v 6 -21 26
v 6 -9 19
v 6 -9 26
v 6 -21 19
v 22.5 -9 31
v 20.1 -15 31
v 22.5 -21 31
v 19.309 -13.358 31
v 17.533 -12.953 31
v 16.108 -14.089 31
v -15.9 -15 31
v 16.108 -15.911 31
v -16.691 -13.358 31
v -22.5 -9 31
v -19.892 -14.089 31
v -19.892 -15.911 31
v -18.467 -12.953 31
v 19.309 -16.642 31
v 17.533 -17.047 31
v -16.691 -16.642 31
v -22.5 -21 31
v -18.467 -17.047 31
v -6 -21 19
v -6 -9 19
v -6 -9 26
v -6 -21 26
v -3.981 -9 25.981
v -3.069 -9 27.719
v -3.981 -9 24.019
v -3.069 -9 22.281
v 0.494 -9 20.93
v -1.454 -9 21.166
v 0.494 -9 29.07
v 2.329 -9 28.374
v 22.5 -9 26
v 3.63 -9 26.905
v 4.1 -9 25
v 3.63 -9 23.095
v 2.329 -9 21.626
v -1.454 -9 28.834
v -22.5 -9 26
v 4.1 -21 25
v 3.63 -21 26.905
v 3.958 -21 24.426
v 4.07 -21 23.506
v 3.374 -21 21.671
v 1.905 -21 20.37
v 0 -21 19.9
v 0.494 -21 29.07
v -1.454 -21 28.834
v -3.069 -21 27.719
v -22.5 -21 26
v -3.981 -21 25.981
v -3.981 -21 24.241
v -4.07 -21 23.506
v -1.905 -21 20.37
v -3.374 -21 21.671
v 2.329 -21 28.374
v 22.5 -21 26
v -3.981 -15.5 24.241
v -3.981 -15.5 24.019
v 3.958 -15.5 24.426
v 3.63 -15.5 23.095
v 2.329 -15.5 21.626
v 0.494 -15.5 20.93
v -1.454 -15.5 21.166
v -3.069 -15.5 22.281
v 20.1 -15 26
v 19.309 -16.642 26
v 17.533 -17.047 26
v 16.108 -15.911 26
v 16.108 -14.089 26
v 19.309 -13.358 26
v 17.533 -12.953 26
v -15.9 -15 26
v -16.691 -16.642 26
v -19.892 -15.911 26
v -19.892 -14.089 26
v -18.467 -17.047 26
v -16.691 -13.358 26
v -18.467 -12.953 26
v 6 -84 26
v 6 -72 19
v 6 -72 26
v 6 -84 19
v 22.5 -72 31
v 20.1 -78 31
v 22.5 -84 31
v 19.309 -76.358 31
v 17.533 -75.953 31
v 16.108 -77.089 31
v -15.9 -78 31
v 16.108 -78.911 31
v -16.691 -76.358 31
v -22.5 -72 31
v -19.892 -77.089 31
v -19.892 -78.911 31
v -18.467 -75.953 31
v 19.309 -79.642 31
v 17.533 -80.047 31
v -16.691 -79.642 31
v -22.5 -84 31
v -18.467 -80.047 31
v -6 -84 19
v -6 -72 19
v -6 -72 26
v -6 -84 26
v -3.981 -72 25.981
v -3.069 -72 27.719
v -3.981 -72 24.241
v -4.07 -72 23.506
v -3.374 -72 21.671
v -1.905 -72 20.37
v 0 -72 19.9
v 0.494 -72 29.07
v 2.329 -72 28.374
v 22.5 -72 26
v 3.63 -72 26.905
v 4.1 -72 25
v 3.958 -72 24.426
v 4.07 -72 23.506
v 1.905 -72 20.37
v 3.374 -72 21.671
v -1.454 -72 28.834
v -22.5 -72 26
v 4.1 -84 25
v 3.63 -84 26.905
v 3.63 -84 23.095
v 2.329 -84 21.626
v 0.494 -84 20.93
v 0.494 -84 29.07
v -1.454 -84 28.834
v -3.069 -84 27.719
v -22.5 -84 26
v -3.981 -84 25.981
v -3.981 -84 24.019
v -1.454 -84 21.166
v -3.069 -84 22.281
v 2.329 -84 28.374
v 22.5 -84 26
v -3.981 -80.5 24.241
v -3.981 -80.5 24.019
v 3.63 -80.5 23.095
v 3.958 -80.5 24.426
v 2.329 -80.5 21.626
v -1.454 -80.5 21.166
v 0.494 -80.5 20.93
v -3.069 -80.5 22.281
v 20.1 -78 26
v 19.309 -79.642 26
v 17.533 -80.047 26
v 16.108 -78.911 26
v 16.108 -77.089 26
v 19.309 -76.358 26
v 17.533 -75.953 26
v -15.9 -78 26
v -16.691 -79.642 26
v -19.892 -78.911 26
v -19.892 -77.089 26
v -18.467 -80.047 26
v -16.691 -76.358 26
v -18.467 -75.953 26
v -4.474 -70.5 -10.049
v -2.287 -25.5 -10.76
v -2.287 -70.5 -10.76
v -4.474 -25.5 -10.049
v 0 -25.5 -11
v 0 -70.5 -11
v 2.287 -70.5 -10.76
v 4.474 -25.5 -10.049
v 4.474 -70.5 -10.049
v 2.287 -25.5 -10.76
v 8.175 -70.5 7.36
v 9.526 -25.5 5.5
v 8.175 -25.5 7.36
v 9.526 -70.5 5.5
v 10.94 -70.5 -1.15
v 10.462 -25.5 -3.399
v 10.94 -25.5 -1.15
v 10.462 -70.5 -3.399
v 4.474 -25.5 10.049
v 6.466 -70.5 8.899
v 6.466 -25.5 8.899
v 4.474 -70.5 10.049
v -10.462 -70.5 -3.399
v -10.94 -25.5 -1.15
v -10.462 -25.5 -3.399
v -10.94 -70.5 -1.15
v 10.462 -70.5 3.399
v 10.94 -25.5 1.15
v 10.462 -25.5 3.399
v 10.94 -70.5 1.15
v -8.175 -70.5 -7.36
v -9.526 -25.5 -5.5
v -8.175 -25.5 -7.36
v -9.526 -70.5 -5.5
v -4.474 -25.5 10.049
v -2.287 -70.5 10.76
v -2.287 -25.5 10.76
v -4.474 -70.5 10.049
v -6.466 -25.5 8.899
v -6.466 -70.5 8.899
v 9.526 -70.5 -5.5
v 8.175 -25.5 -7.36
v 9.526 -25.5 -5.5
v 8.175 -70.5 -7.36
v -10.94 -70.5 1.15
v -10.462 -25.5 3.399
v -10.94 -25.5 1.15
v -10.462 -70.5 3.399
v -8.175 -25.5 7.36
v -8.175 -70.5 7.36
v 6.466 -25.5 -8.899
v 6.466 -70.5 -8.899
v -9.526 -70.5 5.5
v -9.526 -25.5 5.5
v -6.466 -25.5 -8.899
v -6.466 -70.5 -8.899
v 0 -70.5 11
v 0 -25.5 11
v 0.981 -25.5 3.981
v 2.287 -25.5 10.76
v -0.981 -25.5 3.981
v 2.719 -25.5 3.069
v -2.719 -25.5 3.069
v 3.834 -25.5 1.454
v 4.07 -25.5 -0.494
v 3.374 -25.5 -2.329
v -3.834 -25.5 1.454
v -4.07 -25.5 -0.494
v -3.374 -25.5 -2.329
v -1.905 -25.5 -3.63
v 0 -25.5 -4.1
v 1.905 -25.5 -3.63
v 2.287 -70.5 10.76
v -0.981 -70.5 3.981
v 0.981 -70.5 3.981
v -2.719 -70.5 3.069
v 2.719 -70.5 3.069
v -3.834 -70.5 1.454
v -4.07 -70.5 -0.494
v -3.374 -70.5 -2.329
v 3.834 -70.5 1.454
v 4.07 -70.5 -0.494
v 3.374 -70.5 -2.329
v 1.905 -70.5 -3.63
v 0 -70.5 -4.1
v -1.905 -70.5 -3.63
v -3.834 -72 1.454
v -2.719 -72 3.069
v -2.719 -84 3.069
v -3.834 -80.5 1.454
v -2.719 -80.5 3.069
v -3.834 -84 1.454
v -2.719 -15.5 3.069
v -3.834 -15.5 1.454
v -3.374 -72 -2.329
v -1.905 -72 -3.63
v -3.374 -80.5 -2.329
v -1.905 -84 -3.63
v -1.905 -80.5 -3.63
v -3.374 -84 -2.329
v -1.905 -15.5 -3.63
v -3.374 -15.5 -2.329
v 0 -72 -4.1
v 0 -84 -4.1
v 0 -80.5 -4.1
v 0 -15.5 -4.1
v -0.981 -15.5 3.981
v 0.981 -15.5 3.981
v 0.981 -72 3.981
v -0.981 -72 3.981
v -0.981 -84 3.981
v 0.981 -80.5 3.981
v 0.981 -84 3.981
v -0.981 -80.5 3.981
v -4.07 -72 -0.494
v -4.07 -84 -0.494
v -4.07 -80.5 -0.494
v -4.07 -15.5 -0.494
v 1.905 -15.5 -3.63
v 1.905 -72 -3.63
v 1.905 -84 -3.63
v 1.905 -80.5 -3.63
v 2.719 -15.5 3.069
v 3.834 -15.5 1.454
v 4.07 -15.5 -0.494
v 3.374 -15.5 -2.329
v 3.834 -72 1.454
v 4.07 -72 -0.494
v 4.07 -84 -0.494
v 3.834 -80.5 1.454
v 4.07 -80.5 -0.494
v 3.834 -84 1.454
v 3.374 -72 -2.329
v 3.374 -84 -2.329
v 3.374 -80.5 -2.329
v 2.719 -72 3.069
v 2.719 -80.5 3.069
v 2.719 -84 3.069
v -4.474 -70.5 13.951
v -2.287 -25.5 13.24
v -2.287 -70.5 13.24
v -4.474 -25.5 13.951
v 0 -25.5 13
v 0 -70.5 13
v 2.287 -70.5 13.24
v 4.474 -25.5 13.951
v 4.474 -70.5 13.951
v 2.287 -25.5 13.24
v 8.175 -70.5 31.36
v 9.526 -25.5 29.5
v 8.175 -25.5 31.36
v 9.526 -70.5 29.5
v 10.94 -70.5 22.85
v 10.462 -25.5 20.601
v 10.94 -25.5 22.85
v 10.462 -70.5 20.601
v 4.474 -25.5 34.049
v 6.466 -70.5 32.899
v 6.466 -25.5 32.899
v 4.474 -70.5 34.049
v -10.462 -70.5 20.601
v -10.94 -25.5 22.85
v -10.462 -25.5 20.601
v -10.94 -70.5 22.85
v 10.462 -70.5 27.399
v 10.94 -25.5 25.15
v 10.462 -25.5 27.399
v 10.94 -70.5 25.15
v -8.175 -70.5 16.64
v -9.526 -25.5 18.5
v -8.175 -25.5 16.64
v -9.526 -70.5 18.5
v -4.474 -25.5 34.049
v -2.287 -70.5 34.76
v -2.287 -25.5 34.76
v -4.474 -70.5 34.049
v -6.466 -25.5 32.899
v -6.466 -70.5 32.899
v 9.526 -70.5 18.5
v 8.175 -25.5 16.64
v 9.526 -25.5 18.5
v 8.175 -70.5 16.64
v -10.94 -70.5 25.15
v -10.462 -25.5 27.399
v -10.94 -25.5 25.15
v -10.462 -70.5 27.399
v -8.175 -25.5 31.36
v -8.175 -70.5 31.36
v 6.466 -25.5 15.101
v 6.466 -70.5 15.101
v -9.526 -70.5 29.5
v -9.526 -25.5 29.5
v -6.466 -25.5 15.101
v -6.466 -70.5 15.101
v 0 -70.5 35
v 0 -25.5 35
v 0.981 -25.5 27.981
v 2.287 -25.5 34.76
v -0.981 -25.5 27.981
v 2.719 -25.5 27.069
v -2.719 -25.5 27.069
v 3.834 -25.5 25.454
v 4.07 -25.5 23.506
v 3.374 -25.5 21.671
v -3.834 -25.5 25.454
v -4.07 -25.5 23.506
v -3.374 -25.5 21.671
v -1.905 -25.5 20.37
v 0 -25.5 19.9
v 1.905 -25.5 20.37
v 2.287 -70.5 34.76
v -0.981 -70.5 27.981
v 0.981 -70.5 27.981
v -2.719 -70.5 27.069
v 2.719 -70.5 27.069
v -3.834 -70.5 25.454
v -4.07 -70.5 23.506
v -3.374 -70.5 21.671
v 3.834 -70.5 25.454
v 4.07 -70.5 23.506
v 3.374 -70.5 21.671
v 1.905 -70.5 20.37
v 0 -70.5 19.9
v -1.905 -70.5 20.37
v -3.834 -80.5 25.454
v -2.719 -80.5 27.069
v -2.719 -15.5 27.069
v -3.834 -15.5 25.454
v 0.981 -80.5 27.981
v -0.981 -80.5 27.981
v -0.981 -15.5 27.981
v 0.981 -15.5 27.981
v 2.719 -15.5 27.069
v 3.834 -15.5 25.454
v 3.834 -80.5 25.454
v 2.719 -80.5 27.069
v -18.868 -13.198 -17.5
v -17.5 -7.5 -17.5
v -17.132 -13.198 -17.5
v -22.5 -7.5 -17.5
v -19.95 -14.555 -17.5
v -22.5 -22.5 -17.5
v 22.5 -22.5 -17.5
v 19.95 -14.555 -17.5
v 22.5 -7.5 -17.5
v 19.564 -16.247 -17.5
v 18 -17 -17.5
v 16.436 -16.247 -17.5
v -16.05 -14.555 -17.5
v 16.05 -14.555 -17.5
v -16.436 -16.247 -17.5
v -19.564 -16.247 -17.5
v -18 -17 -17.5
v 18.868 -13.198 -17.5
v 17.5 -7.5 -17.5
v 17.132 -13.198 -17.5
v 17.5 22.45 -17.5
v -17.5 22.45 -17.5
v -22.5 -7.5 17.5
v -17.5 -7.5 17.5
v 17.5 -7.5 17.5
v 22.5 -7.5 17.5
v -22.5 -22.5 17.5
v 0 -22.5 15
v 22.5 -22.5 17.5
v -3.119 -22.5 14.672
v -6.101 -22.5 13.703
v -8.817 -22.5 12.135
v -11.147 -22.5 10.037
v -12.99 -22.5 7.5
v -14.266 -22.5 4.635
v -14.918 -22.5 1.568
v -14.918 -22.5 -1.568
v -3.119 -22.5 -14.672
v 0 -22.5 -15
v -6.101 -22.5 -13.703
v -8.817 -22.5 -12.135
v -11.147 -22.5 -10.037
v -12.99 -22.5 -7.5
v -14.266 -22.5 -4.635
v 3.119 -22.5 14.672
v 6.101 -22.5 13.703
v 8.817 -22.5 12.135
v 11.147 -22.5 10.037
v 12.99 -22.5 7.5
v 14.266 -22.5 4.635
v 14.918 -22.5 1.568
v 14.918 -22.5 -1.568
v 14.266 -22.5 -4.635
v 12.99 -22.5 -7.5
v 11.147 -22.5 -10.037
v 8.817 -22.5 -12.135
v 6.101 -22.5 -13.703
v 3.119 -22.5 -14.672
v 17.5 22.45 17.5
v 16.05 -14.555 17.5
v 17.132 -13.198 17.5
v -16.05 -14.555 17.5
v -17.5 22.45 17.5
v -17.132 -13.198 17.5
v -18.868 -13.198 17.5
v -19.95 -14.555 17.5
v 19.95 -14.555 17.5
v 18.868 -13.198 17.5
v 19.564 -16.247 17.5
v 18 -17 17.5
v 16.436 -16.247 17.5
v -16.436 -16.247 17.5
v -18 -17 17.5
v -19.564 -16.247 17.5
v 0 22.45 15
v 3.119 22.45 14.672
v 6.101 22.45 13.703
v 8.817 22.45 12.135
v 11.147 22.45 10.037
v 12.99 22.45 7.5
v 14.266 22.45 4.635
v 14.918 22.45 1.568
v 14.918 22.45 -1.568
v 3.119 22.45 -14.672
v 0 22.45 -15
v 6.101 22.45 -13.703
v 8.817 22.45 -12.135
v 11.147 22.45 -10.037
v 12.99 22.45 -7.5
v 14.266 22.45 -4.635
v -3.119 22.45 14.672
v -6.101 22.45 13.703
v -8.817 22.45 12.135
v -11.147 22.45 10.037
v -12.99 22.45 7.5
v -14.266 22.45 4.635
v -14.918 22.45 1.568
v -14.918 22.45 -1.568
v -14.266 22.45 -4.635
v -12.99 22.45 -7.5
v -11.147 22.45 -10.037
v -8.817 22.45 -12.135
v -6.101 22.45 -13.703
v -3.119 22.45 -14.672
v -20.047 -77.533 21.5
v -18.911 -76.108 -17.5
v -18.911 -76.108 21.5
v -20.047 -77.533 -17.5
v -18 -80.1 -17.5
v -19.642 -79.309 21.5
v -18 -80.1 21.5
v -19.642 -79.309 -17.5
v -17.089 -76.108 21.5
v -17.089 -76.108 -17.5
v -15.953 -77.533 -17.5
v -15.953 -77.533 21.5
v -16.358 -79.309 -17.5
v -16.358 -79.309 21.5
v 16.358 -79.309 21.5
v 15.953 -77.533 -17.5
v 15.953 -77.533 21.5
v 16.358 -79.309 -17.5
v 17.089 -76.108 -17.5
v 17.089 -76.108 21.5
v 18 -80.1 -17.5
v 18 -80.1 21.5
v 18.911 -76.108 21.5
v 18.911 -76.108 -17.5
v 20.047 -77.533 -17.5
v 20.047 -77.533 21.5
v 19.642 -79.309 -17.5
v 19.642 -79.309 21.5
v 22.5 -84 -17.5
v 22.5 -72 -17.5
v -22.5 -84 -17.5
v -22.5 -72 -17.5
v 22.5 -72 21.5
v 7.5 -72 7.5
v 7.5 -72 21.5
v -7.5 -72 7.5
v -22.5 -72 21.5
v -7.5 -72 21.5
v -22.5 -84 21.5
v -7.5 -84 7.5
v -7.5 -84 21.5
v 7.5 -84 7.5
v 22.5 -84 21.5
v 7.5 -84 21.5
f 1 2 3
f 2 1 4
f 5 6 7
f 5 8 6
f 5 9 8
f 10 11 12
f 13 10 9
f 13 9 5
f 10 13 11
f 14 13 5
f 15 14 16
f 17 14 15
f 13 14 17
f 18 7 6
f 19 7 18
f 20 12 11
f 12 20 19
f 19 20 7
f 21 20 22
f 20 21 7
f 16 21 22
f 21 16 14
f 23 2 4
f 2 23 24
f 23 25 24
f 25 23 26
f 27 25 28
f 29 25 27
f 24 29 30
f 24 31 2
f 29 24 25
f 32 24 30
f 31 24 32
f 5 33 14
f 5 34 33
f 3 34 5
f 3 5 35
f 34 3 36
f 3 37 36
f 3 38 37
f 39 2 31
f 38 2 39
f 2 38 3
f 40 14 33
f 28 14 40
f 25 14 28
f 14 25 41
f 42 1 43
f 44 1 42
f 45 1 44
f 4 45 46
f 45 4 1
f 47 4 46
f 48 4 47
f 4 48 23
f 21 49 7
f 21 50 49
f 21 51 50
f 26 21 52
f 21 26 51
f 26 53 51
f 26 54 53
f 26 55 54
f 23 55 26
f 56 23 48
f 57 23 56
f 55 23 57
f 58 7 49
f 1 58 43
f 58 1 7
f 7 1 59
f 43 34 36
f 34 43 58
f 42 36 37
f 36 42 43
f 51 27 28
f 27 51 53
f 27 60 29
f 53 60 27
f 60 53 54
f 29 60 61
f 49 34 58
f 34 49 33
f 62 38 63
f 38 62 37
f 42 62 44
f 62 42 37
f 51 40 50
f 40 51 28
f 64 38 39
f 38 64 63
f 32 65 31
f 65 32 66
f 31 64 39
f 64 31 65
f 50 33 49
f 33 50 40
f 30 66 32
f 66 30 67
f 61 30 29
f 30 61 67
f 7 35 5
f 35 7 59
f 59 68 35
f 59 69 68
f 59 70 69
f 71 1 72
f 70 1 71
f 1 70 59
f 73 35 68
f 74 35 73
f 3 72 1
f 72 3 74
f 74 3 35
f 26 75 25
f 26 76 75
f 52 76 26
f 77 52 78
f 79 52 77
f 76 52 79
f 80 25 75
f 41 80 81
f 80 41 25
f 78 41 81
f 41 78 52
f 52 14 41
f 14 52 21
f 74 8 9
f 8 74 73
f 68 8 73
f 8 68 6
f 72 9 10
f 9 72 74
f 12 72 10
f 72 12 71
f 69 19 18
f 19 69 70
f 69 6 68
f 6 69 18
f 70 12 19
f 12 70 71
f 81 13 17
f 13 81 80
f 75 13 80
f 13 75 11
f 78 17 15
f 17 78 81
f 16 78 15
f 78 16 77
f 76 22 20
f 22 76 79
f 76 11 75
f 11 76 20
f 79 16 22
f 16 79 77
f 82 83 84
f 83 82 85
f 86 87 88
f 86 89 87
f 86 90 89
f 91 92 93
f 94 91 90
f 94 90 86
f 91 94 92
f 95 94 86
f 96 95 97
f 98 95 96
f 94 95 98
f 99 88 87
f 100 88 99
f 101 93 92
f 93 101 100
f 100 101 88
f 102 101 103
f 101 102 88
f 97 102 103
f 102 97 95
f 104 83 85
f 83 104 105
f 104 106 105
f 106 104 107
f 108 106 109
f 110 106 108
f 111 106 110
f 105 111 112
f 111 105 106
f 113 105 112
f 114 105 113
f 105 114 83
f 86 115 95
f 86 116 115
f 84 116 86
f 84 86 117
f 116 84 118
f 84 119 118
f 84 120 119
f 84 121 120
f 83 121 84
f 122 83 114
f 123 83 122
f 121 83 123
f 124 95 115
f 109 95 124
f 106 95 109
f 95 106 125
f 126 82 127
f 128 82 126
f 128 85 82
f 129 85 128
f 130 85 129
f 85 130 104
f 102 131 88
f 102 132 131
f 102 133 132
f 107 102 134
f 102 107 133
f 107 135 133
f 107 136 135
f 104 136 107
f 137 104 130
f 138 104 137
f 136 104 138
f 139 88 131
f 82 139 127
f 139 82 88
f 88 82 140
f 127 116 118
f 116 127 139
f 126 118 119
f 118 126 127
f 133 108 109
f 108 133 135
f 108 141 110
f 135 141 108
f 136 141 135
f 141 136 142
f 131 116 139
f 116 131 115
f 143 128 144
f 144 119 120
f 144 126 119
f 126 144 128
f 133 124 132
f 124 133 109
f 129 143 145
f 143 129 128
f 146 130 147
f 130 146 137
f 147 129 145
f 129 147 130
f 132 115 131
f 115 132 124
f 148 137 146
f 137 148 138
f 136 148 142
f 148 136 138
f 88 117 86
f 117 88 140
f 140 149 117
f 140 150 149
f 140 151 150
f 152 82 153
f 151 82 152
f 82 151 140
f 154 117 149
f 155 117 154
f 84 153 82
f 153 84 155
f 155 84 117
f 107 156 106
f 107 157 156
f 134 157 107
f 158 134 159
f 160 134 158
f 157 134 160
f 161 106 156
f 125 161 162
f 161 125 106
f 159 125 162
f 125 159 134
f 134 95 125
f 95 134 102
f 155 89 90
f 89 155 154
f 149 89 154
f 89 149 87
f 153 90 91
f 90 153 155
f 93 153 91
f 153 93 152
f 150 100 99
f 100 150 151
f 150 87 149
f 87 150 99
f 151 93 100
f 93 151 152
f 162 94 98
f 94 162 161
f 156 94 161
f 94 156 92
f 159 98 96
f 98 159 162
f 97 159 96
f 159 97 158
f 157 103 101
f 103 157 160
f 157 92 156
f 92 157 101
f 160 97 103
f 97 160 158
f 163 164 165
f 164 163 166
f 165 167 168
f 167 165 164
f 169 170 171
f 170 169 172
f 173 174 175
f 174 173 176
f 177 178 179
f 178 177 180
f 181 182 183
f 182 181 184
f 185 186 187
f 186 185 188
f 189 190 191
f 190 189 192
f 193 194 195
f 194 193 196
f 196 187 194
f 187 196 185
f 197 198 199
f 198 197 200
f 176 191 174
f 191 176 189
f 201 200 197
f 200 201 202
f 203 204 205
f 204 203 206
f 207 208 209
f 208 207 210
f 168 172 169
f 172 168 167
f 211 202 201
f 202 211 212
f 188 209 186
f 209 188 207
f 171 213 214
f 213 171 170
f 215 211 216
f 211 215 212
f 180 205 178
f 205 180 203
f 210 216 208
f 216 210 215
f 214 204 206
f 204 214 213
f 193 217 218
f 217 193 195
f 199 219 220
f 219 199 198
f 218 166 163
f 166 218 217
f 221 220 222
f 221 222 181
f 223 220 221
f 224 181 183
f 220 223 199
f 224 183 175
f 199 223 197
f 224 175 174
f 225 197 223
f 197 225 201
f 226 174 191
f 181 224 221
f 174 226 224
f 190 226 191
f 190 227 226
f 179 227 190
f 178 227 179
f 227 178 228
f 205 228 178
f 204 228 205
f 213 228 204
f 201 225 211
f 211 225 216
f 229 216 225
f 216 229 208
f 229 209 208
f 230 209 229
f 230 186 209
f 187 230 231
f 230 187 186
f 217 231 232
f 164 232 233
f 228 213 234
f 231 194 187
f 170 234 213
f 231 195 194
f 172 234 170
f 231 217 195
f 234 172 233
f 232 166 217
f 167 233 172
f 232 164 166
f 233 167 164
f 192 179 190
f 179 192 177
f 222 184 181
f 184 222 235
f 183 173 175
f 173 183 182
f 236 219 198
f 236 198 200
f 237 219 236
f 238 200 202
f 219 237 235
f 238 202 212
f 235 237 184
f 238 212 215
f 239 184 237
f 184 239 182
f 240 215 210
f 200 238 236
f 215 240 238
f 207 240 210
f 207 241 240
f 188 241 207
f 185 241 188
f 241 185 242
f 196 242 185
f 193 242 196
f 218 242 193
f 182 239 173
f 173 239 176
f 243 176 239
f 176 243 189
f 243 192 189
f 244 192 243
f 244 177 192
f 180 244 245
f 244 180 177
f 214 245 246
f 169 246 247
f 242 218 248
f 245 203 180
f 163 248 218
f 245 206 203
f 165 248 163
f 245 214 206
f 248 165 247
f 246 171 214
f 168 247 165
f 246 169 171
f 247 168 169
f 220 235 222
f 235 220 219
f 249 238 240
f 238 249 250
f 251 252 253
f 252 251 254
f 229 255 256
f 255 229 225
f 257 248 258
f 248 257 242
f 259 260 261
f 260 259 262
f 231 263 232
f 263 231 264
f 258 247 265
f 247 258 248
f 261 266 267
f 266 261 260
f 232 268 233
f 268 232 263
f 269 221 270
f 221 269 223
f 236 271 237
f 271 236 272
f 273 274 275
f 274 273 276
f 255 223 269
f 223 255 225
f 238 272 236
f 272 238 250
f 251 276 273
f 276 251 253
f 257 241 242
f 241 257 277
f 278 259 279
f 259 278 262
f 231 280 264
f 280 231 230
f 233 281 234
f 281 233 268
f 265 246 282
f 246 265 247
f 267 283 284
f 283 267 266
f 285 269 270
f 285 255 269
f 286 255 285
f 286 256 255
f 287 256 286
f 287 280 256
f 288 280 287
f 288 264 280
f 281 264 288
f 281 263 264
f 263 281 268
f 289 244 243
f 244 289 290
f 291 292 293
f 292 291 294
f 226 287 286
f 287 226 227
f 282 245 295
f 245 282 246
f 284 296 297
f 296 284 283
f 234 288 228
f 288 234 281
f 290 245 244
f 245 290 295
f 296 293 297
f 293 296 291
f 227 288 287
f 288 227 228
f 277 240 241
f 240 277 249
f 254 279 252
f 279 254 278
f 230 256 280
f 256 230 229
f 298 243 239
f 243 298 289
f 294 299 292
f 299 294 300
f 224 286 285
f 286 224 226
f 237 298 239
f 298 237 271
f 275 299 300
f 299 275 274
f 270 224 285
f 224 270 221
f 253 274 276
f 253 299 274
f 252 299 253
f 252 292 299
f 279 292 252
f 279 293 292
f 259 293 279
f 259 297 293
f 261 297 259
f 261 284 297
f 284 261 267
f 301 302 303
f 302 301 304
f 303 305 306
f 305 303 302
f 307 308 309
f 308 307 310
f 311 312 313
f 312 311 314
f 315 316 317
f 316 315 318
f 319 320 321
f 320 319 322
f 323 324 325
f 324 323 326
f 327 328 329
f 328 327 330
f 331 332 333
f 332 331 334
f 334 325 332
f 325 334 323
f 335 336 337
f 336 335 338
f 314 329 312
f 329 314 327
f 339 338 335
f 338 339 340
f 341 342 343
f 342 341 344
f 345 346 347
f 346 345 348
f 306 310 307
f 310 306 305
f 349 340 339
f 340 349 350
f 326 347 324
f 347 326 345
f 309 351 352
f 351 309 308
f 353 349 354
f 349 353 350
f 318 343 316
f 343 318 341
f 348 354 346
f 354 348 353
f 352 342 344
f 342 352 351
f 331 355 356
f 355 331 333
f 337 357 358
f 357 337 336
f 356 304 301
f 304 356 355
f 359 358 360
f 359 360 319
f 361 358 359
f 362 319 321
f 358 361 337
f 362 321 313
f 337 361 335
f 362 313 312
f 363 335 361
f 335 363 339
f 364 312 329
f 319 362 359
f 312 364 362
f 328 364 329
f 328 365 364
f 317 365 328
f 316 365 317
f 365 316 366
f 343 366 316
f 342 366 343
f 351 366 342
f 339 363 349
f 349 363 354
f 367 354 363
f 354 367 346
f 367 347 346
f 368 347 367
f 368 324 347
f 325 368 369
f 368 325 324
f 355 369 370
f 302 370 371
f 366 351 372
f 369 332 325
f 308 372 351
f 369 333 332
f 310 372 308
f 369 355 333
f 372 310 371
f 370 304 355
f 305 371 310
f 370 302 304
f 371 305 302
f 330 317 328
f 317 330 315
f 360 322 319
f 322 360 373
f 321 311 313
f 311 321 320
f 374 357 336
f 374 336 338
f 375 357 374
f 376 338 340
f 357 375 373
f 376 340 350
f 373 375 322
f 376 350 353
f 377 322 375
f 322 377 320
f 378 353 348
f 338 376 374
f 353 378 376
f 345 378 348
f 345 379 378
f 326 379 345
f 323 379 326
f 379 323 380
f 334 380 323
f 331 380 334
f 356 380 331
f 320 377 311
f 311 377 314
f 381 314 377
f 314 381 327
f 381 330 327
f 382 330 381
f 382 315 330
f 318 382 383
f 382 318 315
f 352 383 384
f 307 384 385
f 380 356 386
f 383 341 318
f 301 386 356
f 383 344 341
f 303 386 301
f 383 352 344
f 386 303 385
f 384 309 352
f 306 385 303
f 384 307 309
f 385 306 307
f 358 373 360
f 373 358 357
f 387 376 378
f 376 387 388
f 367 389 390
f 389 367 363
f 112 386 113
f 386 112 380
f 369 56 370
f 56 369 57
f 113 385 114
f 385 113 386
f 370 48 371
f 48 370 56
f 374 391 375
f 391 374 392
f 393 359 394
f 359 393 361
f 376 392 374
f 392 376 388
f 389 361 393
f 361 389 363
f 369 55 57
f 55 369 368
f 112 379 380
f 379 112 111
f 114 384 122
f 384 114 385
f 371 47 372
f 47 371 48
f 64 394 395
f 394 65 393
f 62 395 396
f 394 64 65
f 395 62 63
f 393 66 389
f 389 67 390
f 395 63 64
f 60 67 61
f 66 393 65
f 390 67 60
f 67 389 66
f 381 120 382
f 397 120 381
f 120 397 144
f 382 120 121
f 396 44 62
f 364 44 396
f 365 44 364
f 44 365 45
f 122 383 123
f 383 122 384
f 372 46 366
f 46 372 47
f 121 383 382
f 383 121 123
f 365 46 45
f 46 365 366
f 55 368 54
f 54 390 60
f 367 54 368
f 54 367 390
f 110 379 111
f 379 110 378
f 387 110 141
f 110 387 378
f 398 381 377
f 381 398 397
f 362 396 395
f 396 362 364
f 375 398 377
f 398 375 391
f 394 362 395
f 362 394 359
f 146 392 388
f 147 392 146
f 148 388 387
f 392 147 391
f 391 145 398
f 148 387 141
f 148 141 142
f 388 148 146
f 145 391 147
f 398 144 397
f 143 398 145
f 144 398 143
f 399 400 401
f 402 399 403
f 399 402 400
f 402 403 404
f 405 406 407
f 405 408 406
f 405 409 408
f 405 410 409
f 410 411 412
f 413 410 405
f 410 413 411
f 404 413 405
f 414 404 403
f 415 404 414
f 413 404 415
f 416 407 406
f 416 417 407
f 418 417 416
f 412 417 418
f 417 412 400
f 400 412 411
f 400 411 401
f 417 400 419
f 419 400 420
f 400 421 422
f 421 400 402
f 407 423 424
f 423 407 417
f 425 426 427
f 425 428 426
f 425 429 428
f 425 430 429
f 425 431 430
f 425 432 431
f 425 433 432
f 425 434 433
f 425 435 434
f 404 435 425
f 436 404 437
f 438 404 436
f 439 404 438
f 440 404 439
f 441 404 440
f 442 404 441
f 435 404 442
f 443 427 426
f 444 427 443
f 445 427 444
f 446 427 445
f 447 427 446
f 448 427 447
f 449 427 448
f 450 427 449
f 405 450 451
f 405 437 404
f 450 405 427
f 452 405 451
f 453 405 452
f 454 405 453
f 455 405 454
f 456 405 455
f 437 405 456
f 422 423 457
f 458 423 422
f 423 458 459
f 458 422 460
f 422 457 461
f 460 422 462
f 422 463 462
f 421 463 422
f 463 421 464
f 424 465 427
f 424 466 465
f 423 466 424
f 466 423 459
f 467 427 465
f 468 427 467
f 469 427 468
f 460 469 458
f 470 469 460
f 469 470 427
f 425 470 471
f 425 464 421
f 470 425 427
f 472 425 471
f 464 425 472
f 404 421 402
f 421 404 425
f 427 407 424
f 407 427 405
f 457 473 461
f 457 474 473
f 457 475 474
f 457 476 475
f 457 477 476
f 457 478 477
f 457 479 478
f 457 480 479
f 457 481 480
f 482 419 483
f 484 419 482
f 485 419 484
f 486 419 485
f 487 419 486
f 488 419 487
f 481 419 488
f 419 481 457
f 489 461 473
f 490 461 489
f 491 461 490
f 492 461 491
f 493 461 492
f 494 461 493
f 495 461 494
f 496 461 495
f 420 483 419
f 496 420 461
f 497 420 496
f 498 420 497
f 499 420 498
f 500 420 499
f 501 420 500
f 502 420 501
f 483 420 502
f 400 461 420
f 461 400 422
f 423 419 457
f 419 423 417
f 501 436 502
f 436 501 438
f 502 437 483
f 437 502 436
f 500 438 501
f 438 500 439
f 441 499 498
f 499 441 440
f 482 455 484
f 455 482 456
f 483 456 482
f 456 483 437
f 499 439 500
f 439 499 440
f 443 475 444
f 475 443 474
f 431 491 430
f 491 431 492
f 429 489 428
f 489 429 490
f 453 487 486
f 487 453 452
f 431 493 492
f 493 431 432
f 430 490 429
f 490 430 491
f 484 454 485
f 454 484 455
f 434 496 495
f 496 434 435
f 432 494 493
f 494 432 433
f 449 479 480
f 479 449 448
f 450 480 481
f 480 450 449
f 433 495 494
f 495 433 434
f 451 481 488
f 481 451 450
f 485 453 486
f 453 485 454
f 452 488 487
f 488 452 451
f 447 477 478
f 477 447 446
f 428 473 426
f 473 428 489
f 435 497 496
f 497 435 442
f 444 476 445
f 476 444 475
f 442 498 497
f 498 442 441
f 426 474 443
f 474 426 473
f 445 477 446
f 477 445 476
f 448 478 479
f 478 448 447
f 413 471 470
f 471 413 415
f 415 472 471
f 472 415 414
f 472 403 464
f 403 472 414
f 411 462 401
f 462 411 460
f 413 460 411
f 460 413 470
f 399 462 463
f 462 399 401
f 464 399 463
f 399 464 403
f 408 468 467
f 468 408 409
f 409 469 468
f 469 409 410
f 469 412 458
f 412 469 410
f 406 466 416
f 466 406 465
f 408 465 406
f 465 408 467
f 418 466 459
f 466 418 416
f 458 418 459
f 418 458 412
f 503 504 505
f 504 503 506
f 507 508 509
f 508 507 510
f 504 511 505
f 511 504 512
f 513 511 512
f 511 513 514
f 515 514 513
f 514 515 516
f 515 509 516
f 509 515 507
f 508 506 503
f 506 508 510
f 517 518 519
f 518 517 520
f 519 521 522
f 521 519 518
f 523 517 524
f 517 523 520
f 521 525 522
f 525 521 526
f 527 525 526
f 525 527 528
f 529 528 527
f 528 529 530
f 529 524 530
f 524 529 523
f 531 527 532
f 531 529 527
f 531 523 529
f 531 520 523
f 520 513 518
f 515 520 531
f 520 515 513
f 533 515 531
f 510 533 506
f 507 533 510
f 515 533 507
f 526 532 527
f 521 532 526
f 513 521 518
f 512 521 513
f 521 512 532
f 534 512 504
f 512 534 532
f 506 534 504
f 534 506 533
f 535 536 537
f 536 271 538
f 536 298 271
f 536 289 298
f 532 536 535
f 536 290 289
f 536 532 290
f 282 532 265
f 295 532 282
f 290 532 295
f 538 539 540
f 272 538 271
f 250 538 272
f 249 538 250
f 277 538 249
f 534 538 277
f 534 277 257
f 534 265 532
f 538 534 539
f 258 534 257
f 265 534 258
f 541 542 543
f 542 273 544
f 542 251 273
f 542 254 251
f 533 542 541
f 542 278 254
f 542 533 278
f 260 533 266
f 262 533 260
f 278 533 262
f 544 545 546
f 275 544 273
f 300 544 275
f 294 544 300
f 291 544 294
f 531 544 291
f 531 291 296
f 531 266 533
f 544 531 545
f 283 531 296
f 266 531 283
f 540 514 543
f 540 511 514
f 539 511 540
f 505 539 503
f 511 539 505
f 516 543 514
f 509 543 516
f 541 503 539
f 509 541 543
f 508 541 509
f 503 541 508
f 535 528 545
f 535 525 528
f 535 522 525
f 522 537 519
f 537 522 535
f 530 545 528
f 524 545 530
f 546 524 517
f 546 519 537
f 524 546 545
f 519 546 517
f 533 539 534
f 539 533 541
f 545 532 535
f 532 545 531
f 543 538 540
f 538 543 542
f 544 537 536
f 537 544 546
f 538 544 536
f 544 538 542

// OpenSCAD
module motor() {
cylinder(h=45.01,r1=15,r2=15,center=true);
    translate([0,0,1.5]){ cylinder(h=48,r1=5,r2=5,center=true);}
}

module motorCase() {
    translate([0,0,-15]) {
    cube([35,45,15], true);
    }
    cube([35,35,44.9], true);
}
module motorMount() {
    difference() {
        motorCase();
        motor();
        rotate([0,90,0]) { translate([15,18,0]) { cylinder(h=45,r1=2,r2=2,center=true); }}
        rotate([0,90,0]) { translate([15,-18,0]) { cylinder(h=45,r1=2,r2=2,center=true); }}
    }
}



module motorRubber() {
cylinder(h=45,r1=11,r2=11,center=true);
}
module secondRubber() {
cylinder(h=45,r1=11,r2=11,center=true);
}
module supportingRod() {
    cylinder(h=65,r1=4.1,r2=4.1,center=true);
}
module rubbersAndRods() {
translate([0,0,-48]){ motorRubber();
    supportingRod();}
translate([-24,0,-48]){
    secondRubber();
    supportingRod();
    }
}

module bracket() {
    difference() {
    cube([12,12,12],true);
    rotate([90,0,0]) { supportingRod(); }
    }
    translate([0,0,3.5]) {
        difference() {
    cube([45,12,5],true);
    translate([18,0,0]) { cylinder(h=45,r1=2.1,r2=2.1,center=true); }
    translate([-18,0,0]) { cylinder(h=45,r1=2.1,r2=2.1,center=true); }
    
    rotate([90,0,0]) translate([0,-2,0]) { { supportingRod(); }}
    
}
    }
}

module otherSide() {
    difference() {
    translate([-2,0,-78]) {
    cube([39,45,12], true);
    }
    translate([0,0,-78]) {
    cube([45.1,15,12.1], true);
    }
    translate([0,0,-63]) {
     rotate([0,90,0]) { translate([15,18,0]) { cylinder(h=45,r1=2.1,r2=2.1,center=true); }}
        rotate([0,90,0]) { translate([15,-18,0]) { cylinder(h=45,r1=2.1,r2=2.1,center=true); }}
    }
}

difference() {
    translate([5,0,-78]) {
    cube([25,45,12], true);
    }
    translate([0,0,-78]) {
    supportingRod();
    }
    
    translate([0,0,-63]) {
     rotate([0,90,0]) { translate([15,18,0]) { cylinder(h=45,r1=2.1,r2=2.1,center=true); }}
        rotate([0,90,0]) { translate([15,-18,0]) { cylinder(h=45,r1=2.1,r2=2.1,center=true); }}
    }
}
    

}


color([0,0,1]) {
translate([0,-15,25]) { bracket(); }
translate([0,-78,25]) { bracket(); }
}
rotate([270,90,0]) {
    color([0.5,0.5,0.5]) {
 rubbersAndRods();
    };
 color([1,0,0]) {motorMount(); }
otherSide();   
}

    
module base() {
    translate([-30,0,-17]) {
    //cube([110,35,10], true);
    }
    translate([1.3,0,0]) {
      motorCase();
    }
    translate([-15.5,0,-5]) {
        translate([0.5,23,5]) {
        cube([14,11,30],true);
        }
        translate([0,-12,5]) {
        cube([14,11,42],true);
        }
    }
    translate([-78,0,-5]) {
        cube([14,14,22],true);
        translate([0,12,5]) {
        cube([14,11,42],true);
        }
        translate([0,-12,5]) {
        cube([14,11,42],true);
        }
    }
    
}

module topOutsideBracket() {
    translate([-78,0,24]) {
        bracket();
    }
    translate([-15.5,0,24]) {
        bracket();
    }
}
